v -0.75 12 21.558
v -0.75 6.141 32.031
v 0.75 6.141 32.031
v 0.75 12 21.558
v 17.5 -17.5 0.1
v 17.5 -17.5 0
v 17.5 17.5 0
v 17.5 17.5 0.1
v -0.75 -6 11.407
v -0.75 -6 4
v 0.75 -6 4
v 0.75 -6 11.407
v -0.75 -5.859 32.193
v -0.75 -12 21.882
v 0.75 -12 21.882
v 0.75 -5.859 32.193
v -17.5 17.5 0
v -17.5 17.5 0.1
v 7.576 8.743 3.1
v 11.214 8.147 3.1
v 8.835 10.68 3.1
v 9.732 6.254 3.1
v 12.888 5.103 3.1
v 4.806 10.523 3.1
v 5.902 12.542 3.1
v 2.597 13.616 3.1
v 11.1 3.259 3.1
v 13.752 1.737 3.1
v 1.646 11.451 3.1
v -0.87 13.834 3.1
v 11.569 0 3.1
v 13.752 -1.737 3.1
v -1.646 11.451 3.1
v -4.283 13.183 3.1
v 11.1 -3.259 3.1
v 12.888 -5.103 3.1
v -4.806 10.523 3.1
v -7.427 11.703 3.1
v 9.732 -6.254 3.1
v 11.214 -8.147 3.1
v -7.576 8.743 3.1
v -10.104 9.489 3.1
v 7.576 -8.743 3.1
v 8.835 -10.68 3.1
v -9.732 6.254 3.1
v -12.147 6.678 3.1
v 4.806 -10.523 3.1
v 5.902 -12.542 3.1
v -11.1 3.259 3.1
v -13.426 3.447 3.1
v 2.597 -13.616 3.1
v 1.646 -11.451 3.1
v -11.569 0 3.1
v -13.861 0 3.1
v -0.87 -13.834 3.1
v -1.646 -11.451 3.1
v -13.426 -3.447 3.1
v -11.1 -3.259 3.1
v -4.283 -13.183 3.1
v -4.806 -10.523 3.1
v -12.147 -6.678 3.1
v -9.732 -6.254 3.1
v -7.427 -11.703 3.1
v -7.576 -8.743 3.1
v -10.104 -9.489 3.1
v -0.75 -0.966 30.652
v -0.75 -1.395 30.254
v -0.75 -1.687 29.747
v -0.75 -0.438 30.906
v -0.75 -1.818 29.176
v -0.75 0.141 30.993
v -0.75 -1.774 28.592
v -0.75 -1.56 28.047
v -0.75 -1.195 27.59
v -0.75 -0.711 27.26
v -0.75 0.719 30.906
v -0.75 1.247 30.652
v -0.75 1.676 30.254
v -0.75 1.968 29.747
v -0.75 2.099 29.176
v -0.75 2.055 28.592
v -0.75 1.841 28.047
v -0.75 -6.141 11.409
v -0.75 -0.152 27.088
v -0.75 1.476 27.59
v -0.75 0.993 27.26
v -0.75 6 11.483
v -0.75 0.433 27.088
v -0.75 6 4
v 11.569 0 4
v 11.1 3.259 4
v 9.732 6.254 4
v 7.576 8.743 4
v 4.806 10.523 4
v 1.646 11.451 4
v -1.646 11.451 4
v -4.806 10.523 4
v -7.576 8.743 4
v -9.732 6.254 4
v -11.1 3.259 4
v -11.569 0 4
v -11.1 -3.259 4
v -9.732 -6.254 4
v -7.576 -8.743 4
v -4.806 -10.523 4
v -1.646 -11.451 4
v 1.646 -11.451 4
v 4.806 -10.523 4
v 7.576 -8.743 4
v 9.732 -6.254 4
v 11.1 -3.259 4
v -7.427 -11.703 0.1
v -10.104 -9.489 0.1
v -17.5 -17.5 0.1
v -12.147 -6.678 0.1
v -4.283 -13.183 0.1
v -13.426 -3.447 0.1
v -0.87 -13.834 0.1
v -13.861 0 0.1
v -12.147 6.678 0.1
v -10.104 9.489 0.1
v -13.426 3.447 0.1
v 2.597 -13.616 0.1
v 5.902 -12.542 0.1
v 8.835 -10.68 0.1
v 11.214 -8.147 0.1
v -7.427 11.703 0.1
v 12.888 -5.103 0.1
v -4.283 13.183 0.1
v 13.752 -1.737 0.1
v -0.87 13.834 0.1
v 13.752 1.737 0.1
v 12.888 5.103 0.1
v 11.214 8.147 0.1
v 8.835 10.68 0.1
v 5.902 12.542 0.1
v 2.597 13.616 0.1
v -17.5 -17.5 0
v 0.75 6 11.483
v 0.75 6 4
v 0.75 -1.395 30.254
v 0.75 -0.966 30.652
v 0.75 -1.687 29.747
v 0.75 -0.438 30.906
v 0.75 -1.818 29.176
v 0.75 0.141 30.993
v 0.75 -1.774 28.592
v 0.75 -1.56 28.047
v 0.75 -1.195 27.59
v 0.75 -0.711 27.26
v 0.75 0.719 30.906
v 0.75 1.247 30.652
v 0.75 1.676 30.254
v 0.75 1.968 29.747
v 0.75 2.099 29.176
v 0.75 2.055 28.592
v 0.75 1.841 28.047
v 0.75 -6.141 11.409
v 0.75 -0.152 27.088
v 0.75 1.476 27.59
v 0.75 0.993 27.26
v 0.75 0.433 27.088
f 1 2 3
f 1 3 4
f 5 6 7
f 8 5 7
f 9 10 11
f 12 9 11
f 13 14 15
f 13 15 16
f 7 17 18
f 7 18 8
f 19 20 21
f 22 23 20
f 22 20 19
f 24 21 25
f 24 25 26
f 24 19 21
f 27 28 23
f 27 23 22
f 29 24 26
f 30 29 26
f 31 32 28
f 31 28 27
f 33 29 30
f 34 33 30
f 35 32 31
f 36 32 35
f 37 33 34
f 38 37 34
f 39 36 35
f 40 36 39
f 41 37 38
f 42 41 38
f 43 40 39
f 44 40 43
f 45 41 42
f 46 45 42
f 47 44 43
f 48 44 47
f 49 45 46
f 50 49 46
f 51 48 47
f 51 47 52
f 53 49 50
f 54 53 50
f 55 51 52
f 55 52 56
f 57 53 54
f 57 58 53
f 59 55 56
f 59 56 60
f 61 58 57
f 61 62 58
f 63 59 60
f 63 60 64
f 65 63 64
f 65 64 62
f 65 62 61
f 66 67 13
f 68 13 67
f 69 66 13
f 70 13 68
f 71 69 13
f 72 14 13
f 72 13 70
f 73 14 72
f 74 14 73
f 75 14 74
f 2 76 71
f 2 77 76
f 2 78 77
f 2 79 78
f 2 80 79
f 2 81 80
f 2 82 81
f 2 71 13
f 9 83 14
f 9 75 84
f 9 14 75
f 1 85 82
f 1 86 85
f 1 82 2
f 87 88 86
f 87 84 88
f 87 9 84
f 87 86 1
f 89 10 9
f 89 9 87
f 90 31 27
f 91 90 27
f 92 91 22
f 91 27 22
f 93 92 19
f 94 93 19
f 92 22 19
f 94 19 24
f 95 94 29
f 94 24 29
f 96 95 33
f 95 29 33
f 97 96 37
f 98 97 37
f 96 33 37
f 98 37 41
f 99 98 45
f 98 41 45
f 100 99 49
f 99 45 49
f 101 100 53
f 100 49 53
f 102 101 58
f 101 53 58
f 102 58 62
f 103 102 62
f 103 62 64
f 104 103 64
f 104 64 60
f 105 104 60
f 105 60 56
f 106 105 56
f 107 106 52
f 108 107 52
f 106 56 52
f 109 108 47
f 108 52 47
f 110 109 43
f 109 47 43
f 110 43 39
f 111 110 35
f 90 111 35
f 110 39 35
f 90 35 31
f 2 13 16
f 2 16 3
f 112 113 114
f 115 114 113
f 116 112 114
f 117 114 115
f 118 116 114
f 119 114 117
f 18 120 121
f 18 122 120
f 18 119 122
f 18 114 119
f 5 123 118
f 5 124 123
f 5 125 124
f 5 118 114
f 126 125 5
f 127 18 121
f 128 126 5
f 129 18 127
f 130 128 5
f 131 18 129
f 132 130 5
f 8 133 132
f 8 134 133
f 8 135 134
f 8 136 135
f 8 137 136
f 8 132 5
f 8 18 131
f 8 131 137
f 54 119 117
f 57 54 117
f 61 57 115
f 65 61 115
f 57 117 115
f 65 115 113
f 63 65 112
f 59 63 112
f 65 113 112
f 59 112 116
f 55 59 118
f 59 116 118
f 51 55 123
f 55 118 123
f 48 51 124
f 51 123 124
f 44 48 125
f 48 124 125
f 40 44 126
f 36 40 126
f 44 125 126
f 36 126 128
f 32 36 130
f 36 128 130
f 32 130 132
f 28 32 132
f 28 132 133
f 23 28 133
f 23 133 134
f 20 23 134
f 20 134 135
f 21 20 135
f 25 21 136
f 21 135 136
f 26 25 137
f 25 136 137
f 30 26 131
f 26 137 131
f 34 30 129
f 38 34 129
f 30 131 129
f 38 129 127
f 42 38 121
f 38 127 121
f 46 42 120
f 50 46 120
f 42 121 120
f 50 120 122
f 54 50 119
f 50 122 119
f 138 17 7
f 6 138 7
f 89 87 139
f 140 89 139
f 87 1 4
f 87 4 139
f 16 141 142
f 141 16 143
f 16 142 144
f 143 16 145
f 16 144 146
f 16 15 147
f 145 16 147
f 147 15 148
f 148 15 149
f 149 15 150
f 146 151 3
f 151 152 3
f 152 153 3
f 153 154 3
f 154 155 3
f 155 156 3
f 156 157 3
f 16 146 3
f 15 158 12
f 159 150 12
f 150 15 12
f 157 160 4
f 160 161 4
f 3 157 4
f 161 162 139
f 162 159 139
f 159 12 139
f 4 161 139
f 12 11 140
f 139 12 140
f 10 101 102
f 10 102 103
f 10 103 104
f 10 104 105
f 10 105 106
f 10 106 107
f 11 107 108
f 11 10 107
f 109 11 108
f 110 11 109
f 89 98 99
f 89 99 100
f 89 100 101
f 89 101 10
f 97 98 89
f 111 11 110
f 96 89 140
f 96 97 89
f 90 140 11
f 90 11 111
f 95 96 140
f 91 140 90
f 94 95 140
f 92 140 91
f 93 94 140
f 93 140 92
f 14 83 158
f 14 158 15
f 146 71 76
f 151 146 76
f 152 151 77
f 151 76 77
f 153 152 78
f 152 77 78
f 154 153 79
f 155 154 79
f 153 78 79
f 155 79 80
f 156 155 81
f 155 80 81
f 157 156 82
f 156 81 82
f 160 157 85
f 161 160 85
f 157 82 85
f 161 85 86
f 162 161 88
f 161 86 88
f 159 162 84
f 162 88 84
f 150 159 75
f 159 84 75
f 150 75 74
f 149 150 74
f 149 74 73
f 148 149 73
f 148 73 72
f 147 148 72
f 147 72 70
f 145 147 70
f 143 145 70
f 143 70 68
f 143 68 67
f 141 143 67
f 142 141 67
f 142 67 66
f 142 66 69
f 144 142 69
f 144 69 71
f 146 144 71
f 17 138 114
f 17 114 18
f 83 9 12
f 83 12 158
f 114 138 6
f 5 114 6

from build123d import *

# Parameters (mm, degrees)
CROQUIS1_W                  = 35
CROQUIS1_H                  = 35
SALIENTE_EXTRUIR1_DEPTH     = 0.1
CROQUIS2_R                  = 13.861230549
SALIENTE_EXTRUIR2_DEPTH     = 3
SALIENTE_EXTRUIR4_START     = 3.1
SALIENTE_EXTRUIR4_OUTLINE_R = 11.568568339
SALIENTE_EXTRUIR4_DEPTH     = 0.9
CROQUIS6_W                  = 1.5
CROQUIS6_H                  = 12
SALIENTE_EXTRUIR6_DEPTH     = 10
SALIENTE_EXTRUIR7_DEPTH     = 1.5
CROQUIS8_R                  = 1.963645542
CORTAR_EXTRUIR1_DEPTH       = 41.93570388


# Read off the part's stored shape, not the designer's step: Saliente-Extruir4
with BuildPart() as part:
    # Croquis1 → Saliente-Extruir1 (new body)
    with BuildSketch(Plane.XY):
        Rectangle(CROQUIS1_W, CROQUIS1_H)
    extrude(amount=SALIENTE_EXTRUIR1_DEPTH)

    # Croquis2 → Saliente-Extruir2 (add)
    with BuildSketch(Plane.XY.offset(0.1)):
        with Locations(Location((0, 0, 0), (0, 0, 180))):
            Circle(CROQUIS2_R)
    extrude(amount=SALIENTE_EXTRUIR2_DEPTH)

    # Saliente-Extruir4 outline → Saliente-Extruir4 (add)
    with BuildSketch(Plane.XY.offset(SALIENTE_EXTRUIR4_START)):
        Circle(SALIENTE_EXTRUIR4_OUTLINE_R)
    extrude(amount=SALIENTE_EXTRUIR4_DEPTH)

    # Croquis6 → Saliente-Extruir6 (add)
    with BuildSketch(Plane.XY.offset(4)):
        Rectangle(CROQUIS6_W, CROQUIS6_H)
    extrude(amount=SALIENTE_EXTRUIR6_DEPTH)

    # Croquis7 → Saliente-Extruir7 (add)
    with BuildSketch(Plane.ZY.offset(0.75)):
        Polygon((11.246605352, 5.859485217), (11.408857848, -6.140514783), (21.882288941, -12), (32.193467539, -5.859485217), (32.031215043, 6.140514783), (21.557783949, 12), align=None)
    extrude(amount=-SALIENTE_EXTRUIR7_DEPTH)

    # Croquis8 → Cortar-Extruir1 (cut, through all)
    with BuildSketch(Plane.ZY.offset(0.75)):
        with Locations((29.029224945, 0.140514783)):
            Circle(CROQUIS8_R)
    extrude(amount=-CORTAR_EXTRUIR1_DEPTH, mode=Mode.SUBTRACT)


solid = part.part
